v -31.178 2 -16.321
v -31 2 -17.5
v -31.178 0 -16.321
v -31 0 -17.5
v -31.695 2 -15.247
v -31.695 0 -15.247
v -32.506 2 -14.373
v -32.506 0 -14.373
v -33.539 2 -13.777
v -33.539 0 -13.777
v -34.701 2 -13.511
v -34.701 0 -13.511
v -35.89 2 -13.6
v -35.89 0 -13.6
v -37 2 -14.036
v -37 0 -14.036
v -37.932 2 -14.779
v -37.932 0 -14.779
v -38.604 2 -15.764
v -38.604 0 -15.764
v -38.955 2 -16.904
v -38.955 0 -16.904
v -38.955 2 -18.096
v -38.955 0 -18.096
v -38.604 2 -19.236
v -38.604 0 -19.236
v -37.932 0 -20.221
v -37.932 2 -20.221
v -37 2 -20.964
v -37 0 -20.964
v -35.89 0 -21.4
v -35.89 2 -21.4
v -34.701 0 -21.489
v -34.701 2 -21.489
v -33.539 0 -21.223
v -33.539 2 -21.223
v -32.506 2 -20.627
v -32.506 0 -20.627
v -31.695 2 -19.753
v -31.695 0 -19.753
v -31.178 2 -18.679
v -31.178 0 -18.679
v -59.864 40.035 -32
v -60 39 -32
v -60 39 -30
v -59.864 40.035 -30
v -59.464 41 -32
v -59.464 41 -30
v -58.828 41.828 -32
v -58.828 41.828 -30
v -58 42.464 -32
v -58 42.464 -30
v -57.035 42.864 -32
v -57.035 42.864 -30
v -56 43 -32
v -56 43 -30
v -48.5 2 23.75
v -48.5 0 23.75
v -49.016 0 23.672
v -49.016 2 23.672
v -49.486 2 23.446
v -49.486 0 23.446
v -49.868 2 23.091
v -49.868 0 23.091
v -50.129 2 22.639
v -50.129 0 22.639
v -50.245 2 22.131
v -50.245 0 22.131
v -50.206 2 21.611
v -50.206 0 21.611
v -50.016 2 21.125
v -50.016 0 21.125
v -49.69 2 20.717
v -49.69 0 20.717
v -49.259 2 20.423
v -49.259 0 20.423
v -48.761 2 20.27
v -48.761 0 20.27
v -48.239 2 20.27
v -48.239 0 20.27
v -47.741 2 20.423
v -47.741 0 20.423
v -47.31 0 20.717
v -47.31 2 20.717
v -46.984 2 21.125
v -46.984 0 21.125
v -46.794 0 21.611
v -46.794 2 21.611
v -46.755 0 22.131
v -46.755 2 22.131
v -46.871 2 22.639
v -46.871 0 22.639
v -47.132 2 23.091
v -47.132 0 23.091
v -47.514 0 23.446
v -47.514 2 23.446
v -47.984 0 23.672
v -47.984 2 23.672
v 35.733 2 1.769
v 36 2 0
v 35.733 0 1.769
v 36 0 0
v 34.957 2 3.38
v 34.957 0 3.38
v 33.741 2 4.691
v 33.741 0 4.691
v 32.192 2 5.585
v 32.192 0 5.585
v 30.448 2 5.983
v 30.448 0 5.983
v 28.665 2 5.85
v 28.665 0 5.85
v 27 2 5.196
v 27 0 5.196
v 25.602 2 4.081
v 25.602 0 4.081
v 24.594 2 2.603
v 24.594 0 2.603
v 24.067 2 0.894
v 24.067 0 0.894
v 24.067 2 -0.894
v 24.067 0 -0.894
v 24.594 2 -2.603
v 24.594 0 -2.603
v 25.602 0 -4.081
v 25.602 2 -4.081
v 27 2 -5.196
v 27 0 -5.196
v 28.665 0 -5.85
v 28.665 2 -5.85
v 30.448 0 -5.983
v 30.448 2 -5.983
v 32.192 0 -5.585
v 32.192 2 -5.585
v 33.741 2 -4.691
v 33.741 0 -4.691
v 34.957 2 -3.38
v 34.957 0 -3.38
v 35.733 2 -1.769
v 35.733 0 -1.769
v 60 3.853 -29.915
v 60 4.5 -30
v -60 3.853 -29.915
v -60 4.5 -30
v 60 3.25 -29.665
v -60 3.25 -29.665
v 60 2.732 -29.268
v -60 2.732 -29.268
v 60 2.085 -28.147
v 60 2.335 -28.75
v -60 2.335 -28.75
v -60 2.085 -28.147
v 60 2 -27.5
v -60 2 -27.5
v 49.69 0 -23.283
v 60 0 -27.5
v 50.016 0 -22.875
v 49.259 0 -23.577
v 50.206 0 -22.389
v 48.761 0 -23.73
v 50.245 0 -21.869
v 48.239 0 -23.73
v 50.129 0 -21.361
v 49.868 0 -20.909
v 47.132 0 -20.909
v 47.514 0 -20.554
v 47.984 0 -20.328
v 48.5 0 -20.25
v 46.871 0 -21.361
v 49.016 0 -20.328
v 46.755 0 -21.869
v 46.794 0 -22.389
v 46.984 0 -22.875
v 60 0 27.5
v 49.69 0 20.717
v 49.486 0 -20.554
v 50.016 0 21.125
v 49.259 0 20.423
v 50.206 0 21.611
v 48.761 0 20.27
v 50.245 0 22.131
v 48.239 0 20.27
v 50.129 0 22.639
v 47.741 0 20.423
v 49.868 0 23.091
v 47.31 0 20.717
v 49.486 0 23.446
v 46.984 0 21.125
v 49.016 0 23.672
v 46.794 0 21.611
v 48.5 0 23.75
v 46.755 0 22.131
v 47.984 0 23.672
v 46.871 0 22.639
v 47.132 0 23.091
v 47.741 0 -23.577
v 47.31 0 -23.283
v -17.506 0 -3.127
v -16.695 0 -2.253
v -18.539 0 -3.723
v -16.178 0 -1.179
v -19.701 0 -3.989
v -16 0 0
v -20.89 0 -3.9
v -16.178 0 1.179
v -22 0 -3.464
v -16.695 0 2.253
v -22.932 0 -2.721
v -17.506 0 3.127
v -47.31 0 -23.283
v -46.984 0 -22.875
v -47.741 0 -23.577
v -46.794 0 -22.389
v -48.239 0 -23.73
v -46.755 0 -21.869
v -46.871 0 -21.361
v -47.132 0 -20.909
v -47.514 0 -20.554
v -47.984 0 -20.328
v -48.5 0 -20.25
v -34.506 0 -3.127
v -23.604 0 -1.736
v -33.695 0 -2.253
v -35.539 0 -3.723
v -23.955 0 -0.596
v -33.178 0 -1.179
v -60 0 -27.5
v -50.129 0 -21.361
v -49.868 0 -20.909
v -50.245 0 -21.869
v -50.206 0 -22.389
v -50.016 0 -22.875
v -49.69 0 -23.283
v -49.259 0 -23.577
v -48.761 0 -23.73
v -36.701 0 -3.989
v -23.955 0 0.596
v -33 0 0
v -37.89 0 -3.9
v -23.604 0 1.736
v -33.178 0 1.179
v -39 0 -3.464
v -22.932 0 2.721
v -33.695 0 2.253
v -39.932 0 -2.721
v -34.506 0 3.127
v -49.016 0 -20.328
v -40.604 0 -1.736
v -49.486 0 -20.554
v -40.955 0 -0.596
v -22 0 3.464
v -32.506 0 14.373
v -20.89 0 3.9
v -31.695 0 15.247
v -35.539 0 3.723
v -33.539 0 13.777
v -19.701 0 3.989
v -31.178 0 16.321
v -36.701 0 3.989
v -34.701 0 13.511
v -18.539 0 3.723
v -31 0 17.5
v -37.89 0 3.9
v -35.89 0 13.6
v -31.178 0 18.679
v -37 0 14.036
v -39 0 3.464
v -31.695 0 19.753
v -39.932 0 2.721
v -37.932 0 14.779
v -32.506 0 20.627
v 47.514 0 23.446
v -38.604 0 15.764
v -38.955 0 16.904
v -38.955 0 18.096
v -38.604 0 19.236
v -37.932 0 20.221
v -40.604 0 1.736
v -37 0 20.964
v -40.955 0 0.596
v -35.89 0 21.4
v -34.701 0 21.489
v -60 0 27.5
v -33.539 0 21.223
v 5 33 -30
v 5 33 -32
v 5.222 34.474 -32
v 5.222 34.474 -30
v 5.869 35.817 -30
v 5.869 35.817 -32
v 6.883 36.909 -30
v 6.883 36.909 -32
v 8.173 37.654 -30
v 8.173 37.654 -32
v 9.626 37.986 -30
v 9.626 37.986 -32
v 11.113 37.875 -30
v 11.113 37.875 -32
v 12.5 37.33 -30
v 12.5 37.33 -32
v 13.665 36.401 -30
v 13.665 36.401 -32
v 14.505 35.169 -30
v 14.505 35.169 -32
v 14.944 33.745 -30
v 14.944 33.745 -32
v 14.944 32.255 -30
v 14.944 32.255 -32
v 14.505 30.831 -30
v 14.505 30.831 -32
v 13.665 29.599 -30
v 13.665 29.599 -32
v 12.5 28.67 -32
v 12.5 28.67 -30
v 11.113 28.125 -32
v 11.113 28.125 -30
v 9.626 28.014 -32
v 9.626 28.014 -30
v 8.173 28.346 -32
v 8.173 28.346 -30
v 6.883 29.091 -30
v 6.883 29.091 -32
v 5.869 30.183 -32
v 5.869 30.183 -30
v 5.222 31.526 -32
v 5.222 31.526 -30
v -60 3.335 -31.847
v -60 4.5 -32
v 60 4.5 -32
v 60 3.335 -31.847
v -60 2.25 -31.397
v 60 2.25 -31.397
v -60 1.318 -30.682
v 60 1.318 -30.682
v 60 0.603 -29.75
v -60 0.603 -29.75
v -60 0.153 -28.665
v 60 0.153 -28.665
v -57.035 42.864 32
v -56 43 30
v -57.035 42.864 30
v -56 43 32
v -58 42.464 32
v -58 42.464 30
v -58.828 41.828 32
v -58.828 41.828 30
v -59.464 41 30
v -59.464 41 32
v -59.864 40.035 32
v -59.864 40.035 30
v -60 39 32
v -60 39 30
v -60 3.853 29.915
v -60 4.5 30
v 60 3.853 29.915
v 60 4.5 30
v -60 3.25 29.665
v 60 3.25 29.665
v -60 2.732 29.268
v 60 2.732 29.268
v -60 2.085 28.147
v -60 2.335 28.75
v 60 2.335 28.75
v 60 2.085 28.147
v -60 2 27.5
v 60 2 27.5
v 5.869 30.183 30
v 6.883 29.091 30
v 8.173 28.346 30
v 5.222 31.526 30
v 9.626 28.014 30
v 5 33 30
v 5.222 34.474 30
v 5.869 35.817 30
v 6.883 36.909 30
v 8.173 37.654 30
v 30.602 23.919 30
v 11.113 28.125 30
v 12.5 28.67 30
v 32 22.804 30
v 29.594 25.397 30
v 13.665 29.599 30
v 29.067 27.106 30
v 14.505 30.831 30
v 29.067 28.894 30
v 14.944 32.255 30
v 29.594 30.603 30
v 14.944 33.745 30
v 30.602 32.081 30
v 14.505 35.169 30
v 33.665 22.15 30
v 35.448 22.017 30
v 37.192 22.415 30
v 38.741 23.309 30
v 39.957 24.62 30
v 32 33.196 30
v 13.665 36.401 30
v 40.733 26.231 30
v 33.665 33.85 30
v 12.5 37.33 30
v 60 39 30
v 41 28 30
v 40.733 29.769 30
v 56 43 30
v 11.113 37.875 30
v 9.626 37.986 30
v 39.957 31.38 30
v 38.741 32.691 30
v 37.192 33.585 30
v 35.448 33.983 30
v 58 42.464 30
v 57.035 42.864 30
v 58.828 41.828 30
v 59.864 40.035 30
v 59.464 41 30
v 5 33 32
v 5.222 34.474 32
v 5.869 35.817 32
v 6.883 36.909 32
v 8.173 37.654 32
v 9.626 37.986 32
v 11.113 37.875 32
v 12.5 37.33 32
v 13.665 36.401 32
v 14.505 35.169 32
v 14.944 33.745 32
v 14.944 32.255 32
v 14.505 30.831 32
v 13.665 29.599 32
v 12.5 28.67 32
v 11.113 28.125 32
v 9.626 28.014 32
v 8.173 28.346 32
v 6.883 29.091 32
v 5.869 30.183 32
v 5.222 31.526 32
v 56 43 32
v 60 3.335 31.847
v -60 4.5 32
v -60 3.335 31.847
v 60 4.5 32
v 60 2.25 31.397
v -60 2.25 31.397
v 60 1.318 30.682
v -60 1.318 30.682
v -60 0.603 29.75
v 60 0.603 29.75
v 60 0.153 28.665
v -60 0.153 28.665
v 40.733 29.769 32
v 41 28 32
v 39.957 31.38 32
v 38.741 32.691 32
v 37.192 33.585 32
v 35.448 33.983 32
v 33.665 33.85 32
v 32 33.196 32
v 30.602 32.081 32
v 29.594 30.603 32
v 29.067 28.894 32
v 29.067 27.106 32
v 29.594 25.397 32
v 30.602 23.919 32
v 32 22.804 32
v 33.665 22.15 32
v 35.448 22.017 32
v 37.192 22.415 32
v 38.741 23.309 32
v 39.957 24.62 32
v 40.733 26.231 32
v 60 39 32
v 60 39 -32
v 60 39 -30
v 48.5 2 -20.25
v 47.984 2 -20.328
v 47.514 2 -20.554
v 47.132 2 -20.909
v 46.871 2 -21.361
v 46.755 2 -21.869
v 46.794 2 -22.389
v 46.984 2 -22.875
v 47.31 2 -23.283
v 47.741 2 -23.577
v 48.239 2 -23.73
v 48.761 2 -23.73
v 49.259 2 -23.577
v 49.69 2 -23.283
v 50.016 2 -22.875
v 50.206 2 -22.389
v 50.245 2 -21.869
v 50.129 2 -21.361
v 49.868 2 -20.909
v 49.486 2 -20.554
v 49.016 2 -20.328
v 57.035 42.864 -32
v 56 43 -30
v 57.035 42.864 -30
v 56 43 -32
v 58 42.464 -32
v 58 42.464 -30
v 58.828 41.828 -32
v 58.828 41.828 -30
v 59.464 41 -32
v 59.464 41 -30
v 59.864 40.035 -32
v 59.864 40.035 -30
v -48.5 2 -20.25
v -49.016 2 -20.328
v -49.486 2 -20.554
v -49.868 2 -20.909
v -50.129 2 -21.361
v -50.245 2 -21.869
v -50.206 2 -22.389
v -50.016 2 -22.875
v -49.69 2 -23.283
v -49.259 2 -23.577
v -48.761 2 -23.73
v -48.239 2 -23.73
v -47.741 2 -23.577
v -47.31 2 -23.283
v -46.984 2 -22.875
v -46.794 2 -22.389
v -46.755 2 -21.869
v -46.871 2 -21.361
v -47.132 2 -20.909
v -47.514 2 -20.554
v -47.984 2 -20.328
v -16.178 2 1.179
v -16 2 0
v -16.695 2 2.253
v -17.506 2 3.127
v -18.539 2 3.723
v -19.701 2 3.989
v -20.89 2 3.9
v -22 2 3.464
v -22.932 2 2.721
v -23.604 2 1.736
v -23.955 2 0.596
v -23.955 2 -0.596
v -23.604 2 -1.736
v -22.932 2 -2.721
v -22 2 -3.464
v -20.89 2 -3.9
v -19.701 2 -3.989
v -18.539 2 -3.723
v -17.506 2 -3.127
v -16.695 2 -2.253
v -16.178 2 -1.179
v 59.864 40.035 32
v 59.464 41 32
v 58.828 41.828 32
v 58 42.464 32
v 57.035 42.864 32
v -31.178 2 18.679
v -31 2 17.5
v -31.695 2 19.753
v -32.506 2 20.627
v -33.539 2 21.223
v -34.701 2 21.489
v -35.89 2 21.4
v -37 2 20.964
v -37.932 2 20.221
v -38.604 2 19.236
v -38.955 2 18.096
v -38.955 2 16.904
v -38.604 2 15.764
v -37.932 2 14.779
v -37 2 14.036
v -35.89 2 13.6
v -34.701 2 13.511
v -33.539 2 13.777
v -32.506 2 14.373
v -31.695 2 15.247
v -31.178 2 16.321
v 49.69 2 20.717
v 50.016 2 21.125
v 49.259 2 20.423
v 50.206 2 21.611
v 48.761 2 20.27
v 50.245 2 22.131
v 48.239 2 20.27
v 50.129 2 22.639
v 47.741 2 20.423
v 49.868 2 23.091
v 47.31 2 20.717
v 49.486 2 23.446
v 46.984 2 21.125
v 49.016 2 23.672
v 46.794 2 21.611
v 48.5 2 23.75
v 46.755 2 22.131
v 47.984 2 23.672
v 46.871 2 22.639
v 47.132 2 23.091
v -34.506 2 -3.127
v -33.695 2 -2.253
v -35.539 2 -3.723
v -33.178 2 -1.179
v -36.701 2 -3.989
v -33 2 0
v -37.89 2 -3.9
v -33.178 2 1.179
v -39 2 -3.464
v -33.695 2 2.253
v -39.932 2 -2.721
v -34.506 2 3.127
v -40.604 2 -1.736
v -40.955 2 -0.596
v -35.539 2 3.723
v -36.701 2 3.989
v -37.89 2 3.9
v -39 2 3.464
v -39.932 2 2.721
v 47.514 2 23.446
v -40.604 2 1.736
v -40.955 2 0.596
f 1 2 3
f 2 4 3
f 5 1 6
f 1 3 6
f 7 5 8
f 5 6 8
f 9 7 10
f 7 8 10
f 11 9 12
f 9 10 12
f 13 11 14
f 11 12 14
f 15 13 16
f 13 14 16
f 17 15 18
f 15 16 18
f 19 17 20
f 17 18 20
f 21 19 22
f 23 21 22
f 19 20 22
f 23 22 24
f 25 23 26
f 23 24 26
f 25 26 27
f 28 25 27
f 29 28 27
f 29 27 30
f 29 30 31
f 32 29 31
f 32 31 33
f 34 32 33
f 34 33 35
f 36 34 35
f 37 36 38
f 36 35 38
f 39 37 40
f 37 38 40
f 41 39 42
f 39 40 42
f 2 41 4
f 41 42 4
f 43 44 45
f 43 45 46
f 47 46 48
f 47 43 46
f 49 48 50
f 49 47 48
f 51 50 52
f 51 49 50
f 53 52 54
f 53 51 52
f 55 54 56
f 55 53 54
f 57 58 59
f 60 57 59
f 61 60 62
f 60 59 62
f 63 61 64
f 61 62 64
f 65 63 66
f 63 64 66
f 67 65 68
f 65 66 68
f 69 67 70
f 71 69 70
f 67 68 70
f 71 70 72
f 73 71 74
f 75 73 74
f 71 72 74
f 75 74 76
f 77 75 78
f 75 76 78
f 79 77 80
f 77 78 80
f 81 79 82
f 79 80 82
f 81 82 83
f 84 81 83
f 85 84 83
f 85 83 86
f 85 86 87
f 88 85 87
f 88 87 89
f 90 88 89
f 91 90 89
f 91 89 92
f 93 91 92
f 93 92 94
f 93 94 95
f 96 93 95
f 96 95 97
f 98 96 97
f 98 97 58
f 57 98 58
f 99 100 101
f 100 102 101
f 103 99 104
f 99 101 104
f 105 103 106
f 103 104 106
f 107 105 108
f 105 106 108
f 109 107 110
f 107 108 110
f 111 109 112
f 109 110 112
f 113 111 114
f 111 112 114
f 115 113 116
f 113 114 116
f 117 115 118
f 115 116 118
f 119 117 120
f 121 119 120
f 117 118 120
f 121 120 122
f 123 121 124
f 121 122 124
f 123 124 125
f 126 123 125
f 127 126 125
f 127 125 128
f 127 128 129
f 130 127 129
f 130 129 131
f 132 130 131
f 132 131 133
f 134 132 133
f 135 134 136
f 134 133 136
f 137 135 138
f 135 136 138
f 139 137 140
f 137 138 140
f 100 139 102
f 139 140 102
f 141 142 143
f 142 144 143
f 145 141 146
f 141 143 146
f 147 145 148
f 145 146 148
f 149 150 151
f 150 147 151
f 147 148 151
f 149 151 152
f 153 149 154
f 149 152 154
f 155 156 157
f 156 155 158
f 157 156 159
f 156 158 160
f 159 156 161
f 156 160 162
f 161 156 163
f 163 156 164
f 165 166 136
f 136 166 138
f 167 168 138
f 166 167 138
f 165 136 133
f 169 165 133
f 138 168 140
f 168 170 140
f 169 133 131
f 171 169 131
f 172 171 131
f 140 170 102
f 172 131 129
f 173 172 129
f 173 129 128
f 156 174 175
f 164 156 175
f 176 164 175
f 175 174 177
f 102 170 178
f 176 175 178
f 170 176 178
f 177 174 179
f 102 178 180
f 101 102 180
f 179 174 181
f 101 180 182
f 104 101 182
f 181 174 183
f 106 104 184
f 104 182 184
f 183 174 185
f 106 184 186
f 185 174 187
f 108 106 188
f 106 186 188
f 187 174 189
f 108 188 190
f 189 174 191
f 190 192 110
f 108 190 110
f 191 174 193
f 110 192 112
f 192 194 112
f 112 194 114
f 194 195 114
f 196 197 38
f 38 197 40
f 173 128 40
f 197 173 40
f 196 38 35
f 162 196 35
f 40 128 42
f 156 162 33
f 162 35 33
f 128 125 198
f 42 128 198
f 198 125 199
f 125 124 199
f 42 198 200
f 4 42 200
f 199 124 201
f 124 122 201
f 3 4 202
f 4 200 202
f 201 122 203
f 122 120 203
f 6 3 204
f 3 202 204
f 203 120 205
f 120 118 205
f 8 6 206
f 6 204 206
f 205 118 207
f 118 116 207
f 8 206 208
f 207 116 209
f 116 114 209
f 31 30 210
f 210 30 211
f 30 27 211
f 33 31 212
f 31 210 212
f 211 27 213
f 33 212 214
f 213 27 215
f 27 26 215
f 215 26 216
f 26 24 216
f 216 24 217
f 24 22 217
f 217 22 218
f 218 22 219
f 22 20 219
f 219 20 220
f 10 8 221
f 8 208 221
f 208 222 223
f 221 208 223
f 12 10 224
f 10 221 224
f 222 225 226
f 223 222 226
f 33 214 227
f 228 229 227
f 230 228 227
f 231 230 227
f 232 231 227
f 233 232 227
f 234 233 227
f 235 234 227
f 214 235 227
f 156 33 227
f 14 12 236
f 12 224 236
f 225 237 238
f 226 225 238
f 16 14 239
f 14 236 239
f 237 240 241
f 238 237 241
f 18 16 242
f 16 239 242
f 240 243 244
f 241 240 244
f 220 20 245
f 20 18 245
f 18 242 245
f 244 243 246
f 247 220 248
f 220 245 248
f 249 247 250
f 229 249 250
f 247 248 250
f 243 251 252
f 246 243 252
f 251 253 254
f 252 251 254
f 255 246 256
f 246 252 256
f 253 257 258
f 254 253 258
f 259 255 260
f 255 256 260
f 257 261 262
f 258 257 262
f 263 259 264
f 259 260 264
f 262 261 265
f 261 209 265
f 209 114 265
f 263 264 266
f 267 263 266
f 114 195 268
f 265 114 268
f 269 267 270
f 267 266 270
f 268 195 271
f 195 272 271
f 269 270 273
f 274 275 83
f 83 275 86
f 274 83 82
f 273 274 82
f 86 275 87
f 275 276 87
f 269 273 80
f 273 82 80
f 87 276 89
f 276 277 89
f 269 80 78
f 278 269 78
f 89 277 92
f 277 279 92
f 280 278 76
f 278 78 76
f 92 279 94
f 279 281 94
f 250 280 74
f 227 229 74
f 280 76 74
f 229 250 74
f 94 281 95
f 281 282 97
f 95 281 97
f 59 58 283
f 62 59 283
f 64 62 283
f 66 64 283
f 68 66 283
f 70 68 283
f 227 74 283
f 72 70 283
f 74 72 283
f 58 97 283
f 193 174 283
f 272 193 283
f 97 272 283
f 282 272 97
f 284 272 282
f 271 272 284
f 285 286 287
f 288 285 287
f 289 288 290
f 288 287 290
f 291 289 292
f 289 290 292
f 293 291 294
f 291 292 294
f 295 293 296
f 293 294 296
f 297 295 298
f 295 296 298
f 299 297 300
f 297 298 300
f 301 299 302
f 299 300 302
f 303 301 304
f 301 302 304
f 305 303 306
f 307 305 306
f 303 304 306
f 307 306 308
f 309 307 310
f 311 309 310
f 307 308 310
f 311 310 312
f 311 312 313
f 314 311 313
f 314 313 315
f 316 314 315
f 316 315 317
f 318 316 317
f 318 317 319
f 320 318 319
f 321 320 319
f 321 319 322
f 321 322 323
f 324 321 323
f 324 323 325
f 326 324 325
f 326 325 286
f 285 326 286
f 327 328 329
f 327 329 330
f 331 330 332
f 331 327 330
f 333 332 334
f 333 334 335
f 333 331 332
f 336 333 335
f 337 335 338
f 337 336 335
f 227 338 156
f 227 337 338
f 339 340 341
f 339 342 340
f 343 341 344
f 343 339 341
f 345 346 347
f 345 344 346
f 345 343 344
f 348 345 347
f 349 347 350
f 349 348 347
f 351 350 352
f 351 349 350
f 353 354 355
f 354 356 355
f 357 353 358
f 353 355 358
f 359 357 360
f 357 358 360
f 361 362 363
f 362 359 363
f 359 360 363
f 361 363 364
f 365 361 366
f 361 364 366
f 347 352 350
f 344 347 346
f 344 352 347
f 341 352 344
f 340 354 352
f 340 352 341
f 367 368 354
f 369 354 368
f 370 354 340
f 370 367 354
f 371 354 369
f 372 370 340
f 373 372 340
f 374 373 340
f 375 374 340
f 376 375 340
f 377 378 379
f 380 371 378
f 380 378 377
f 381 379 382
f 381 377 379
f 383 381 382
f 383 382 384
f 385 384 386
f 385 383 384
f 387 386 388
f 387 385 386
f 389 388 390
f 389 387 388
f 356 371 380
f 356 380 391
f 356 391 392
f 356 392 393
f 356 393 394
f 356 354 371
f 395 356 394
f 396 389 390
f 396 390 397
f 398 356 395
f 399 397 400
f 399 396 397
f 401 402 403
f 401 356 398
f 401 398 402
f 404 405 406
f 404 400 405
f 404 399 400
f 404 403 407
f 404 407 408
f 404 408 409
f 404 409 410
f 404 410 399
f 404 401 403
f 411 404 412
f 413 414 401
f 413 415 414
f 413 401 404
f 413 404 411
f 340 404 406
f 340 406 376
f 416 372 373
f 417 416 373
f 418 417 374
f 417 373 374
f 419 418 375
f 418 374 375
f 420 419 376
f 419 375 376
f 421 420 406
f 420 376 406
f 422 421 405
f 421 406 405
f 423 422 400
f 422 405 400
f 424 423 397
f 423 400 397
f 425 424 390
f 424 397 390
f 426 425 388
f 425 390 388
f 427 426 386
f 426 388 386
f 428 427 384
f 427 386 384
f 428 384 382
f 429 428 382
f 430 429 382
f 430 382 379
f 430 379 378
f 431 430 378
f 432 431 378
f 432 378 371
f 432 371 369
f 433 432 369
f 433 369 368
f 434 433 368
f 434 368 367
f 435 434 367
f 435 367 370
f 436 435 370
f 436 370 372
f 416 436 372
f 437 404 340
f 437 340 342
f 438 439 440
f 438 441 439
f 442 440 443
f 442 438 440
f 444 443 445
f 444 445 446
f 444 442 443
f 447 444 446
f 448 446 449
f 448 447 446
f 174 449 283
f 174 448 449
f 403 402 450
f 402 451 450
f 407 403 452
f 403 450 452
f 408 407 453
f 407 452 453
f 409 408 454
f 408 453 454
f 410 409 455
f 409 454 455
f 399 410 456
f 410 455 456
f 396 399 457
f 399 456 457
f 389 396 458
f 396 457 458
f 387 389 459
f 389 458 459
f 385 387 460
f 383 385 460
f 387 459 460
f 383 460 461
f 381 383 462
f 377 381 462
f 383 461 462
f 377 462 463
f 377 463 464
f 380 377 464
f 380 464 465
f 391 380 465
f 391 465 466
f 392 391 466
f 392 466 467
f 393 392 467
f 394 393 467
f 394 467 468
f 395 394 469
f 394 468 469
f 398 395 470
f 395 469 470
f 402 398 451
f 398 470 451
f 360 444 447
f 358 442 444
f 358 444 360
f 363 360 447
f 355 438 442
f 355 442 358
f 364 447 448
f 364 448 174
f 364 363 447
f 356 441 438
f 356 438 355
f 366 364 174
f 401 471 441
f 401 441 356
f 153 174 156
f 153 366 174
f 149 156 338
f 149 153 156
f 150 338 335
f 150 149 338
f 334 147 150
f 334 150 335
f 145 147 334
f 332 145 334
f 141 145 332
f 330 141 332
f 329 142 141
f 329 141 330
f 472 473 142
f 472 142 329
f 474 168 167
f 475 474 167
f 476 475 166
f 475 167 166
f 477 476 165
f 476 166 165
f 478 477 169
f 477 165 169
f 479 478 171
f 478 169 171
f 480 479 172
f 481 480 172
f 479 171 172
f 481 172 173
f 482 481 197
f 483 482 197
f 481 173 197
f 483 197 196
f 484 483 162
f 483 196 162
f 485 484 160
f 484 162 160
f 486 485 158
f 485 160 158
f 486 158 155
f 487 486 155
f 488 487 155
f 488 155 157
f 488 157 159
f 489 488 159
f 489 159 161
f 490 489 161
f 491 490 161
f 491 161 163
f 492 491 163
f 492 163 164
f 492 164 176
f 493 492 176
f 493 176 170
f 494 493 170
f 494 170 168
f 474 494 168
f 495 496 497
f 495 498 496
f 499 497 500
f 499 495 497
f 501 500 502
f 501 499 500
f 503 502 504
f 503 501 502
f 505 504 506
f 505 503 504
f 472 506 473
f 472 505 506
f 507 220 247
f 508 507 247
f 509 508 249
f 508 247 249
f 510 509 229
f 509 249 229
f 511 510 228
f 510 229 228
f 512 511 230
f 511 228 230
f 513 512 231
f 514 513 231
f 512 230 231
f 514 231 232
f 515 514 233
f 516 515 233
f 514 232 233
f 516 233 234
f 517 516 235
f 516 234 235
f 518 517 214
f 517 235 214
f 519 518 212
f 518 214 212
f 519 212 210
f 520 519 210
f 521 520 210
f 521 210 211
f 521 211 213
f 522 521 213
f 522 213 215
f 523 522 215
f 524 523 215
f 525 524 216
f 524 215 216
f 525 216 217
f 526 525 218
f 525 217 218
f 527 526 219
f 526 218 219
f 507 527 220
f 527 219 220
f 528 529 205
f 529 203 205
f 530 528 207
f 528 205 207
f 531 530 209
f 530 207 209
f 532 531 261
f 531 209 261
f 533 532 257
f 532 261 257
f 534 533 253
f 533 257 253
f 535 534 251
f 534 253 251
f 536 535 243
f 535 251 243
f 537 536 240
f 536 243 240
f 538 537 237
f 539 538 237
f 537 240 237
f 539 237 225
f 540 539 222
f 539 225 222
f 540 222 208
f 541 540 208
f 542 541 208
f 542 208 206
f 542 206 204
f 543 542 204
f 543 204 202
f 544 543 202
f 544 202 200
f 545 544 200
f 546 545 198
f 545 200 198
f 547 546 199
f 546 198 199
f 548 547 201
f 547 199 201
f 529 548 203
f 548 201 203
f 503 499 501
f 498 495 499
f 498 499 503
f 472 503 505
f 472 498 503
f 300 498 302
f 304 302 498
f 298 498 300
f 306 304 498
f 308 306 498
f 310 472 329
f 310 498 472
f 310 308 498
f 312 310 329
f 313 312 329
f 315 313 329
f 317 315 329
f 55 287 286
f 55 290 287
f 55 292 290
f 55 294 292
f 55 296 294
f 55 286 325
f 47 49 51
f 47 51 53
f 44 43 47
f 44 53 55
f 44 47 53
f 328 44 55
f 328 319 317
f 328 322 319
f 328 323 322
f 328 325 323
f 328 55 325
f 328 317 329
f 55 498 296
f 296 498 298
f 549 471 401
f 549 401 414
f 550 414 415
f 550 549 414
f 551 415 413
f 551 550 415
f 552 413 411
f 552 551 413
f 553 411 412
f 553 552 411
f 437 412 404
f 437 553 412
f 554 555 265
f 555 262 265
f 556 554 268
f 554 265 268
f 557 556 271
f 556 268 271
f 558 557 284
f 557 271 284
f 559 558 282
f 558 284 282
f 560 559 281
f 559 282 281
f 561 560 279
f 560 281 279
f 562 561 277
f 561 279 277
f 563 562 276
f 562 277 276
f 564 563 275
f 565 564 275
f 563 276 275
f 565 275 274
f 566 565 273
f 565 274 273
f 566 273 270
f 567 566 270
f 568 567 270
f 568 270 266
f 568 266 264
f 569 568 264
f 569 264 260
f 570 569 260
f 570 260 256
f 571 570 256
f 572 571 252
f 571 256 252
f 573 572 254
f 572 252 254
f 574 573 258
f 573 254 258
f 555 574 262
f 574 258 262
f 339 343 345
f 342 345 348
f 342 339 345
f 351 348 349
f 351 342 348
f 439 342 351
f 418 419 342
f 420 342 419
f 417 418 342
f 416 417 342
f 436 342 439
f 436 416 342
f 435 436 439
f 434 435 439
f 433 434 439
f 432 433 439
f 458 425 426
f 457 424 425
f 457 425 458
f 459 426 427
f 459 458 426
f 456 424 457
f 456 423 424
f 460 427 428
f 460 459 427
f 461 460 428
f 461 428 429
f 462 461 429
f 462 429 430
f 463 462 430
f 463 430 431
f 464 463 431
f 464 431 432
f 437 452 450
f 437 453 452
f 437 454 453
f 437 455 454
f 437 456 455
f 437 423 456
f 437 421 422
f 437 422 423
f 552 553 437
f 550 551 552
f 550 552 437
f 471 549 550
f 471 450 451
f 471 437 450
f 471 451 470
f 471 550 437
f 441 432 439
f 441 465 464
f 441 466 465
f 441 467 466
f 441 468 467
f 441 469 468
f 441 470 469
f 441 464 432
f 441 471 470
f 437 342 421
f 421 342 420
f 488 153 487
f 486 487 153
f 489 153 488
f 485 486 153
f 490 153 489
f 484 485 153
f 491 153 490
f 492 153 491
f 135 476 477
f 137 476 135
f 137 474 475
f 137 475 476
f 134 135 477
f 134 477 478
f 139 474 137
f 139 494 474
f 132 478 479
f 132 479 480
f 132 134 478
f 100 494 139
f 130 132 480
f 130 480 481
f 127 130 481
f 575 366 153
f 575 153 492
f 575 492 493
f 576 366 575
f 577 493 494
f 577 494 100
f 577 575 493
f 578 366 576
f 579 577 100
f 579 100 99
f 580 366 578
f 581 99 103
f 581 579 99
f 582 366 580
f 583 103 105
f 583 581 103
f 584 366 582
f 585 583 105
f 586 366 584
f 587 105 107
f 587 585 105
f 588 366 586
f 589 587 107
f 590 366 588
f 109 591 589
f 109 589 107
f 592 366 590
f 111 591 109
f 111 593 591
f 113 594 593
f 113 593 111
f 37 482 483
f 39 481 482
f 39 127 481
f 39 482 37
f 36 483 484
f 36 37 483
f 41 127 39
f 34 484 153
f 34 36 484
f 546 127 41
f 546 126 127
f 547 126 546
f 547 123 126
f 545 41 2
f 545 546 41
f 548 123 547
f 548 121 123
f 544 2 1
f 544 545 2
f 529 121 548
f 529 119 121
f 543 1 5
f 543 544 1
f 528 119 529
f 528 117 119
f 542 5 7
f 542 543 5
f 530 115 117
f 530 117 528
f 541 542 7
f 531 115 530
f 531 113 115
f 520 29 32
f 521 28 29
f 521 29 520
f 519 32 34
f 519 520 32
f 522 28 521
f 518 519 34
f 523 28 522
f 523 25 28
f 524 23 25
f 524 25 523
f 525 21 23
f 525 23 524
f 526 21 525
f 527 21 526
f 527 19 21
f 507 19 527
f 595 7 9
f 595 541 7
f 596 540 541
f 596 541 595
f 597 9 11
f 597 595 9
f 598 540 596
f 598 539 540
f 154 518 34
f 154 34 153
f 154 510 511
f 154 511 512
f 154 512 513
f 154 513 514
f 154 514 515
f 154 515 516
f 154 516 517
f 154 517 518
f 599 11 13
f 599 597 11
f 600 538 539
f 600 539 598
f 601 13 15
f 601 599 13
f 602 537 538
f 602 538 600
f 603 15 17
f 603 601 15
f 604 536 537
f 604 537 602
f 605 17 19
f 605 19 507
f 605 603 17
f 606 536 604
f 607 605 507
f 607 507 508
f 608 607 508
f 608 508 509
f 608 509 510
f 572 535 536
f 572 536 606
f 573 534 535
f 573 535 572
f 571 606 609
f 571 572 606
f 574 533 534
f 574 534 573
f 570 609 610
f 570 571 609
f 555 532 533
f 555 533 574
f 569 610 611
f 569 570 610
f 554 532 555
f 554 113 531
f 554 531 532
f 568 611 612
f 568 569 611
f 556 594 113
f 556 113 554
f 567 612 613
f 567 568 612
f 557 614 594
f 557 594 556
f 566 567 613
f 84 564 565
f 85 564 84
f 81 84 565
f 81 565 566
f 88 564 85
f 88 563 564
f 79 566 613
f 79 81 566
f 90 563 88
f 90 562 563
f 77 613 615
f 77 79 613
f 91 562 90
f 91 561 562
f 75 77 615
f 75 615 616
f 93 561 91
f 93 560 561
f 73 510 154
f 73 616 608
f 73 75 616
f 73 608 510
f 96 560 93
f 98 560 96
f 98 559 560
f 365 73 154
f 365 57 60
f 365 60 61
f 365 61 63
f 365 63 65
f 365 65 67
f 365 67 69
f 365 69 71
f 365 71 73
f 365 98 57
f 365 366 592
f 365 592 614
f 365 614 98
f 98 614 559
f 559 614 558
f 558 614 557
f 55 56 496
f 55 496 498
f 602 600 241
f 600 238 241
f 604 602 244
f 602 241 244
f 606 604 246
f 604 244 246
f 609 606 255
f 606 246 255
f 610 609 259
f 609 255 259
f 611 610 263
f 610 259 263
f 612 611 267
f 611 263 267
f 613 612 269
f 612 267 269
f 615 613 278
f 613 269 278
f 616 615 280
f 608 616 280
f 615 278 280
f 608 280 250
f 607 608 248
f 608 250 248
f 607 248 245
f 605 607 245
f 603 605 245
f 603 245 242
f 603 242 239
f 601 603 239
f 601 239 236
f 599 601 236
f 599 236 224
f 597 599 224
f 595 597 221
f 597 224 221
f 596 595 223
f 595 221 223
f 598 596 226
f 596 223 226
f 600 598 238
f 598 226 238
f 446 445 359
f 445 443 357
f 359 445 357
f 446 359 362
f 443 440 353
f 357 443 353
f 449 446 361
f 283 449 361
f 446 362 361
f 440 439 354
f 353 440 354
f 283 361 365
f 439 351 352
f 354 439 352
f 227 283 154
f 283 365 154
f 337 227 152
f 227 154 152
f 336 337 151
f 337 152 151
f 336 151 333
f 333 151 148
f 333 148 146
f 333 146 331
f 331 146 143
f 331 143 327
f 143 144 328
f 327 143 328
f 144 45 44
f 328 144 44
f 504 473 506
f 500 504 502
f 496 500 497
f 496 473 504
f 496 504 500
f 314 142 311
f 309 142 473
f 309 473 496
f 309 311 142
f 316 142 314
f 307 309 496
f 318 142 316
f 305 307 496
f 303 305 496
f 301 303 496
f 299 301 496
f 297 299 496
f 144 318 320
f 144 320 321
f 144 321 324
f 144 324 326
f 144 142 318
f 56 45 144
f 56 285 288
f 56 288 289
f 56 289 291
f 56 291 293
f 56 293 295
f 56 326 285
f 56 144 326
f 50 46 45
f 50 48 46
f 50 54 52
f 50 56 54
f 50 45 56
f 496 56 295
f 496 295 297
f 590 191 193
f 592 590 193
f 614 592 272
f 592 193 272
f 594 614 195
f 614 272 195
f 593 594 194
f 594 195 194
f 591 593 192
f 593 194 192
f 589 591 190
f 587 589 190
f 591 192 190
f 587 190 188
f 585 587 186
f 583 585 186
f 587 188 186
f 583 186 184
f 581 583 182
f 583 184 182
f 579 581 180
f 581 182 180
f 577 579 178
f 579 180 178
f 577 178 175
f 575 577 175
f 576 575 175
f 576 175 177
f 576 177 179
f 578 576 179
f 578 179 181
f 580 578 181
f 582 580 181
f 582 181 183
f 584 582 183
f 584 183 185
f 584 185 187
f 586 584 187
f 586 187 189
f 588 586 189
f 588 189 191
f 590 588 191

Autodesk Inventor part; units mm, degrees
ref_plane "YZ Plane" through (0, 0, 0) normal (1, 0, 0) x (0, 1, 0)
ref_plane "XZ Plane" through (0, 0, 0) normal (0, 1, 0) x (-1, 0, 0)
ref_plane "XY Plane" through (0, 0, 0) normal (0, 0, 1) x (1, 0, 0)
sketch "Szkic1" plane through (0, 0, 0) normal (0, 1, 0) x (-1, 0, 0)
  line L0 (-60, -30) -> (60, -30)
  line L1 (60, -30) -> (60, 30)
  line L2 (60, 30) -> (-60, 30)
  line L3 (-60, 30) -> (-60, -30)
  line L4 (-60, -30) -> (60, 30) construction
  line L5 (60, -30) -> (-60, 30) construction
  point P0 (0, 0)
  dimension "d0" = 120
  dimension "d1" = 60
extrude "Płyta1" add sketch "Szkic1" along normal blind 2
sketch "Szkic2" plane through (60, 2, 30) normal (0, 0, 1) x (1, 0, 0)
  line L0 (-120, 0) -> (0, 0)
  line L1 (0, 0) -> (0, 41)
  line L2 (0, 41) -> (-120, 41)
  line L3 (-120, 41) -> (-120, 0)
edge flange "Kołnierz1" height 43 angle 90 thickness 2 bend radius 2.5 thickness toward (0, 0, 1) relief tear relief width 2 relief depth 1 corner gap 2 corner form 0 edges at (0, 2, 30) (0, 2, -30) wall of the first edge with corners at (-60, 2, 30) (60, 2, 30) (60, 43, 30) (-60, 43, 30)
bend "Zagięcie1"
corner "Narożnik1"
sketch "Szkic3" plane through (0, 2, 0) normal (0, 1, 0) x (1, 0, 0)
  circle A0 centre (48.5, 22) radius 1.2295 projected
  circle A1 centre (48.5, -22) radius 1.2295 projected
  circle A2 centre (-48.5, 22) radius 1.2295 projected
  circle A3 centre (-48.5, -22) radius 1.2295 projected
  point P0 (0, 0)
hole "Otwór1" at (48.5, 2, -22) at (48.5, 2, 22) at (-48.5, 2, -22) at (-48.5, 2, 22) direction (0, -1, 0) diameter 3.5 depth 2 tip angle 118 clearance for "Śruba ze łbem płaskim obrobiona" size "M3" standard "ANSI Profil metryczny M"
fillet "Zaokrąglenie1" radius 4 4 edges at (-60, 43, -31) (-60, 43, 31) (60, 43, 31) (60, 43, -31)
sketch "Szkic4" plane through (0, 0, 0) normal (0, -1, 0) x (1, 0, 0)
  circle A0 centre (-20, 0) radius 4
  circle A1 centre (-35, 17.5) radius 4
  circle A2 centre (-35, -17.5) radius 4
  line L0 (-60, -27.5) -> (-60, 27.5) projected
  point P0 (0, 0)
  dimension "d22" = 35
  dimension "d23" = 17.5
  dimension "d24" = 15
  dimension "d25" = 8
  dimension "d26" = 25
extrude "Wytnij1" cut sketch "Szkic4" against normal blind 2
sketch "Szkic5" plane through (0, 0, 0) normal (0, -1, 0) x (1, 0, 0)
  circle A0 centre (30, 0) radius 6
  line L0 (60, 27.5) -> (60, -27.5) projected
  point P0 (0, 0)
  point P1 (60, 0)
  dimension "d29" = 12
  dimension "d30" = 30
extrude "Wytnij2" cut sketch "Szkic5" against normal blind 2
sketch "Szkic6" plane through (60, 4.5, -32) normal (0, 0, -1) x (-1, 0, 0)
  circle A0 centre (50, 28.5) radius 5
  line L0 (4, 38.5) -> (116, 38.5) projected
  line L1 (0, 0) -> (0, 34.5) projected
  point P0 (60, -4.5)
  dimension "d33" = 10
  dimension "d34" = 10
  dimension "d35" = 50
extrude "Wytnij3" cut sketch "Szkic6" against normal through all
sketch "Szkic7" plane through (0, 0, 0) normal (0, -1, 0) x (1, 0, 0)
  circle A0 centre (-37, 0) radius 4
  line L0 (-60, -27.5) -> (-60, 27.5) projected
  point P0 (0, 0)
  point P1 (-60, 0)
  dimension "d38" = 8
  dimension "d39" = 23
extrude "Wytnij4" cut sketch "Szkic7" against normal blind 2
sketch "Szkic8" plane through (-60, 4.5, 32) normal (0, 0, 1) x (1, 0, 0)
  circle A0 centre (95, 23.5) radius 6
  line L0 (120, 34.5) -> (120, 0) projected
  circle A1 centre (70, 28.5) radius 5 projected
  line L1 (4, 38.5) -> (116, 38.5) projected
  point P0 (60, -4.5)
  dimension "d42" = 12
  dimension "d43" = 25
  dimension "d46" = 15
extrude "Wytnij5" cut sketch "Szkic8" against normal blind 2 contours A0
equation "\"d19\" = Grubość"
equation "\"d23\" = 0.5 * d22"
equation "\"d27\" = Grubość"
equation "\"d31\" = Grubość"
equation "\"d36\" = Grubość"
equation "\"d40\" = Grubość"
equation "\"d44\" = Grubość"
equation "\"d2\" = Grubość"
equation "\"d3\" = SzerokośćGięciaPodcięcia"
equation "\"d4\" = GłębokośćGięciaPodcięcia"
equation "\"d5\" = MinimalnaPozostałość"
equation "\"d6\" = PromieńPrzejścia"
equation "\"d10\" = RozmiarPodcięciaNarożnika"
equation "\"d11\" = Wielk_odstępu"
equation "\"d12\" = Rozmiar_promienia_Jacobiego"
equation "\"PromieńGięcia\" = Grubość"
equation "\"SzerokośćGięciaPodcięcia\" = Grubość"
equation "\"GłębokośćGięciaPodcięcia\" = 0.5 * Grubość"
equation "\"RozmiarPodcięciaNarożnika\" = 4 * Grubość"
equation "\"MinimalnaPozostałość\" = 2 * Grubość"
equation "\"PromieńPrzejścia\" = PromieńGięcia"
equation "\"Rozmiar_promienia_Jacobiego\" = PromieńGięcia"
equation "\"Wielk_odstępu\" = Grubość"
equation "\"Grubość\" = 2"
properties part number "dekiel" material "Stal"
